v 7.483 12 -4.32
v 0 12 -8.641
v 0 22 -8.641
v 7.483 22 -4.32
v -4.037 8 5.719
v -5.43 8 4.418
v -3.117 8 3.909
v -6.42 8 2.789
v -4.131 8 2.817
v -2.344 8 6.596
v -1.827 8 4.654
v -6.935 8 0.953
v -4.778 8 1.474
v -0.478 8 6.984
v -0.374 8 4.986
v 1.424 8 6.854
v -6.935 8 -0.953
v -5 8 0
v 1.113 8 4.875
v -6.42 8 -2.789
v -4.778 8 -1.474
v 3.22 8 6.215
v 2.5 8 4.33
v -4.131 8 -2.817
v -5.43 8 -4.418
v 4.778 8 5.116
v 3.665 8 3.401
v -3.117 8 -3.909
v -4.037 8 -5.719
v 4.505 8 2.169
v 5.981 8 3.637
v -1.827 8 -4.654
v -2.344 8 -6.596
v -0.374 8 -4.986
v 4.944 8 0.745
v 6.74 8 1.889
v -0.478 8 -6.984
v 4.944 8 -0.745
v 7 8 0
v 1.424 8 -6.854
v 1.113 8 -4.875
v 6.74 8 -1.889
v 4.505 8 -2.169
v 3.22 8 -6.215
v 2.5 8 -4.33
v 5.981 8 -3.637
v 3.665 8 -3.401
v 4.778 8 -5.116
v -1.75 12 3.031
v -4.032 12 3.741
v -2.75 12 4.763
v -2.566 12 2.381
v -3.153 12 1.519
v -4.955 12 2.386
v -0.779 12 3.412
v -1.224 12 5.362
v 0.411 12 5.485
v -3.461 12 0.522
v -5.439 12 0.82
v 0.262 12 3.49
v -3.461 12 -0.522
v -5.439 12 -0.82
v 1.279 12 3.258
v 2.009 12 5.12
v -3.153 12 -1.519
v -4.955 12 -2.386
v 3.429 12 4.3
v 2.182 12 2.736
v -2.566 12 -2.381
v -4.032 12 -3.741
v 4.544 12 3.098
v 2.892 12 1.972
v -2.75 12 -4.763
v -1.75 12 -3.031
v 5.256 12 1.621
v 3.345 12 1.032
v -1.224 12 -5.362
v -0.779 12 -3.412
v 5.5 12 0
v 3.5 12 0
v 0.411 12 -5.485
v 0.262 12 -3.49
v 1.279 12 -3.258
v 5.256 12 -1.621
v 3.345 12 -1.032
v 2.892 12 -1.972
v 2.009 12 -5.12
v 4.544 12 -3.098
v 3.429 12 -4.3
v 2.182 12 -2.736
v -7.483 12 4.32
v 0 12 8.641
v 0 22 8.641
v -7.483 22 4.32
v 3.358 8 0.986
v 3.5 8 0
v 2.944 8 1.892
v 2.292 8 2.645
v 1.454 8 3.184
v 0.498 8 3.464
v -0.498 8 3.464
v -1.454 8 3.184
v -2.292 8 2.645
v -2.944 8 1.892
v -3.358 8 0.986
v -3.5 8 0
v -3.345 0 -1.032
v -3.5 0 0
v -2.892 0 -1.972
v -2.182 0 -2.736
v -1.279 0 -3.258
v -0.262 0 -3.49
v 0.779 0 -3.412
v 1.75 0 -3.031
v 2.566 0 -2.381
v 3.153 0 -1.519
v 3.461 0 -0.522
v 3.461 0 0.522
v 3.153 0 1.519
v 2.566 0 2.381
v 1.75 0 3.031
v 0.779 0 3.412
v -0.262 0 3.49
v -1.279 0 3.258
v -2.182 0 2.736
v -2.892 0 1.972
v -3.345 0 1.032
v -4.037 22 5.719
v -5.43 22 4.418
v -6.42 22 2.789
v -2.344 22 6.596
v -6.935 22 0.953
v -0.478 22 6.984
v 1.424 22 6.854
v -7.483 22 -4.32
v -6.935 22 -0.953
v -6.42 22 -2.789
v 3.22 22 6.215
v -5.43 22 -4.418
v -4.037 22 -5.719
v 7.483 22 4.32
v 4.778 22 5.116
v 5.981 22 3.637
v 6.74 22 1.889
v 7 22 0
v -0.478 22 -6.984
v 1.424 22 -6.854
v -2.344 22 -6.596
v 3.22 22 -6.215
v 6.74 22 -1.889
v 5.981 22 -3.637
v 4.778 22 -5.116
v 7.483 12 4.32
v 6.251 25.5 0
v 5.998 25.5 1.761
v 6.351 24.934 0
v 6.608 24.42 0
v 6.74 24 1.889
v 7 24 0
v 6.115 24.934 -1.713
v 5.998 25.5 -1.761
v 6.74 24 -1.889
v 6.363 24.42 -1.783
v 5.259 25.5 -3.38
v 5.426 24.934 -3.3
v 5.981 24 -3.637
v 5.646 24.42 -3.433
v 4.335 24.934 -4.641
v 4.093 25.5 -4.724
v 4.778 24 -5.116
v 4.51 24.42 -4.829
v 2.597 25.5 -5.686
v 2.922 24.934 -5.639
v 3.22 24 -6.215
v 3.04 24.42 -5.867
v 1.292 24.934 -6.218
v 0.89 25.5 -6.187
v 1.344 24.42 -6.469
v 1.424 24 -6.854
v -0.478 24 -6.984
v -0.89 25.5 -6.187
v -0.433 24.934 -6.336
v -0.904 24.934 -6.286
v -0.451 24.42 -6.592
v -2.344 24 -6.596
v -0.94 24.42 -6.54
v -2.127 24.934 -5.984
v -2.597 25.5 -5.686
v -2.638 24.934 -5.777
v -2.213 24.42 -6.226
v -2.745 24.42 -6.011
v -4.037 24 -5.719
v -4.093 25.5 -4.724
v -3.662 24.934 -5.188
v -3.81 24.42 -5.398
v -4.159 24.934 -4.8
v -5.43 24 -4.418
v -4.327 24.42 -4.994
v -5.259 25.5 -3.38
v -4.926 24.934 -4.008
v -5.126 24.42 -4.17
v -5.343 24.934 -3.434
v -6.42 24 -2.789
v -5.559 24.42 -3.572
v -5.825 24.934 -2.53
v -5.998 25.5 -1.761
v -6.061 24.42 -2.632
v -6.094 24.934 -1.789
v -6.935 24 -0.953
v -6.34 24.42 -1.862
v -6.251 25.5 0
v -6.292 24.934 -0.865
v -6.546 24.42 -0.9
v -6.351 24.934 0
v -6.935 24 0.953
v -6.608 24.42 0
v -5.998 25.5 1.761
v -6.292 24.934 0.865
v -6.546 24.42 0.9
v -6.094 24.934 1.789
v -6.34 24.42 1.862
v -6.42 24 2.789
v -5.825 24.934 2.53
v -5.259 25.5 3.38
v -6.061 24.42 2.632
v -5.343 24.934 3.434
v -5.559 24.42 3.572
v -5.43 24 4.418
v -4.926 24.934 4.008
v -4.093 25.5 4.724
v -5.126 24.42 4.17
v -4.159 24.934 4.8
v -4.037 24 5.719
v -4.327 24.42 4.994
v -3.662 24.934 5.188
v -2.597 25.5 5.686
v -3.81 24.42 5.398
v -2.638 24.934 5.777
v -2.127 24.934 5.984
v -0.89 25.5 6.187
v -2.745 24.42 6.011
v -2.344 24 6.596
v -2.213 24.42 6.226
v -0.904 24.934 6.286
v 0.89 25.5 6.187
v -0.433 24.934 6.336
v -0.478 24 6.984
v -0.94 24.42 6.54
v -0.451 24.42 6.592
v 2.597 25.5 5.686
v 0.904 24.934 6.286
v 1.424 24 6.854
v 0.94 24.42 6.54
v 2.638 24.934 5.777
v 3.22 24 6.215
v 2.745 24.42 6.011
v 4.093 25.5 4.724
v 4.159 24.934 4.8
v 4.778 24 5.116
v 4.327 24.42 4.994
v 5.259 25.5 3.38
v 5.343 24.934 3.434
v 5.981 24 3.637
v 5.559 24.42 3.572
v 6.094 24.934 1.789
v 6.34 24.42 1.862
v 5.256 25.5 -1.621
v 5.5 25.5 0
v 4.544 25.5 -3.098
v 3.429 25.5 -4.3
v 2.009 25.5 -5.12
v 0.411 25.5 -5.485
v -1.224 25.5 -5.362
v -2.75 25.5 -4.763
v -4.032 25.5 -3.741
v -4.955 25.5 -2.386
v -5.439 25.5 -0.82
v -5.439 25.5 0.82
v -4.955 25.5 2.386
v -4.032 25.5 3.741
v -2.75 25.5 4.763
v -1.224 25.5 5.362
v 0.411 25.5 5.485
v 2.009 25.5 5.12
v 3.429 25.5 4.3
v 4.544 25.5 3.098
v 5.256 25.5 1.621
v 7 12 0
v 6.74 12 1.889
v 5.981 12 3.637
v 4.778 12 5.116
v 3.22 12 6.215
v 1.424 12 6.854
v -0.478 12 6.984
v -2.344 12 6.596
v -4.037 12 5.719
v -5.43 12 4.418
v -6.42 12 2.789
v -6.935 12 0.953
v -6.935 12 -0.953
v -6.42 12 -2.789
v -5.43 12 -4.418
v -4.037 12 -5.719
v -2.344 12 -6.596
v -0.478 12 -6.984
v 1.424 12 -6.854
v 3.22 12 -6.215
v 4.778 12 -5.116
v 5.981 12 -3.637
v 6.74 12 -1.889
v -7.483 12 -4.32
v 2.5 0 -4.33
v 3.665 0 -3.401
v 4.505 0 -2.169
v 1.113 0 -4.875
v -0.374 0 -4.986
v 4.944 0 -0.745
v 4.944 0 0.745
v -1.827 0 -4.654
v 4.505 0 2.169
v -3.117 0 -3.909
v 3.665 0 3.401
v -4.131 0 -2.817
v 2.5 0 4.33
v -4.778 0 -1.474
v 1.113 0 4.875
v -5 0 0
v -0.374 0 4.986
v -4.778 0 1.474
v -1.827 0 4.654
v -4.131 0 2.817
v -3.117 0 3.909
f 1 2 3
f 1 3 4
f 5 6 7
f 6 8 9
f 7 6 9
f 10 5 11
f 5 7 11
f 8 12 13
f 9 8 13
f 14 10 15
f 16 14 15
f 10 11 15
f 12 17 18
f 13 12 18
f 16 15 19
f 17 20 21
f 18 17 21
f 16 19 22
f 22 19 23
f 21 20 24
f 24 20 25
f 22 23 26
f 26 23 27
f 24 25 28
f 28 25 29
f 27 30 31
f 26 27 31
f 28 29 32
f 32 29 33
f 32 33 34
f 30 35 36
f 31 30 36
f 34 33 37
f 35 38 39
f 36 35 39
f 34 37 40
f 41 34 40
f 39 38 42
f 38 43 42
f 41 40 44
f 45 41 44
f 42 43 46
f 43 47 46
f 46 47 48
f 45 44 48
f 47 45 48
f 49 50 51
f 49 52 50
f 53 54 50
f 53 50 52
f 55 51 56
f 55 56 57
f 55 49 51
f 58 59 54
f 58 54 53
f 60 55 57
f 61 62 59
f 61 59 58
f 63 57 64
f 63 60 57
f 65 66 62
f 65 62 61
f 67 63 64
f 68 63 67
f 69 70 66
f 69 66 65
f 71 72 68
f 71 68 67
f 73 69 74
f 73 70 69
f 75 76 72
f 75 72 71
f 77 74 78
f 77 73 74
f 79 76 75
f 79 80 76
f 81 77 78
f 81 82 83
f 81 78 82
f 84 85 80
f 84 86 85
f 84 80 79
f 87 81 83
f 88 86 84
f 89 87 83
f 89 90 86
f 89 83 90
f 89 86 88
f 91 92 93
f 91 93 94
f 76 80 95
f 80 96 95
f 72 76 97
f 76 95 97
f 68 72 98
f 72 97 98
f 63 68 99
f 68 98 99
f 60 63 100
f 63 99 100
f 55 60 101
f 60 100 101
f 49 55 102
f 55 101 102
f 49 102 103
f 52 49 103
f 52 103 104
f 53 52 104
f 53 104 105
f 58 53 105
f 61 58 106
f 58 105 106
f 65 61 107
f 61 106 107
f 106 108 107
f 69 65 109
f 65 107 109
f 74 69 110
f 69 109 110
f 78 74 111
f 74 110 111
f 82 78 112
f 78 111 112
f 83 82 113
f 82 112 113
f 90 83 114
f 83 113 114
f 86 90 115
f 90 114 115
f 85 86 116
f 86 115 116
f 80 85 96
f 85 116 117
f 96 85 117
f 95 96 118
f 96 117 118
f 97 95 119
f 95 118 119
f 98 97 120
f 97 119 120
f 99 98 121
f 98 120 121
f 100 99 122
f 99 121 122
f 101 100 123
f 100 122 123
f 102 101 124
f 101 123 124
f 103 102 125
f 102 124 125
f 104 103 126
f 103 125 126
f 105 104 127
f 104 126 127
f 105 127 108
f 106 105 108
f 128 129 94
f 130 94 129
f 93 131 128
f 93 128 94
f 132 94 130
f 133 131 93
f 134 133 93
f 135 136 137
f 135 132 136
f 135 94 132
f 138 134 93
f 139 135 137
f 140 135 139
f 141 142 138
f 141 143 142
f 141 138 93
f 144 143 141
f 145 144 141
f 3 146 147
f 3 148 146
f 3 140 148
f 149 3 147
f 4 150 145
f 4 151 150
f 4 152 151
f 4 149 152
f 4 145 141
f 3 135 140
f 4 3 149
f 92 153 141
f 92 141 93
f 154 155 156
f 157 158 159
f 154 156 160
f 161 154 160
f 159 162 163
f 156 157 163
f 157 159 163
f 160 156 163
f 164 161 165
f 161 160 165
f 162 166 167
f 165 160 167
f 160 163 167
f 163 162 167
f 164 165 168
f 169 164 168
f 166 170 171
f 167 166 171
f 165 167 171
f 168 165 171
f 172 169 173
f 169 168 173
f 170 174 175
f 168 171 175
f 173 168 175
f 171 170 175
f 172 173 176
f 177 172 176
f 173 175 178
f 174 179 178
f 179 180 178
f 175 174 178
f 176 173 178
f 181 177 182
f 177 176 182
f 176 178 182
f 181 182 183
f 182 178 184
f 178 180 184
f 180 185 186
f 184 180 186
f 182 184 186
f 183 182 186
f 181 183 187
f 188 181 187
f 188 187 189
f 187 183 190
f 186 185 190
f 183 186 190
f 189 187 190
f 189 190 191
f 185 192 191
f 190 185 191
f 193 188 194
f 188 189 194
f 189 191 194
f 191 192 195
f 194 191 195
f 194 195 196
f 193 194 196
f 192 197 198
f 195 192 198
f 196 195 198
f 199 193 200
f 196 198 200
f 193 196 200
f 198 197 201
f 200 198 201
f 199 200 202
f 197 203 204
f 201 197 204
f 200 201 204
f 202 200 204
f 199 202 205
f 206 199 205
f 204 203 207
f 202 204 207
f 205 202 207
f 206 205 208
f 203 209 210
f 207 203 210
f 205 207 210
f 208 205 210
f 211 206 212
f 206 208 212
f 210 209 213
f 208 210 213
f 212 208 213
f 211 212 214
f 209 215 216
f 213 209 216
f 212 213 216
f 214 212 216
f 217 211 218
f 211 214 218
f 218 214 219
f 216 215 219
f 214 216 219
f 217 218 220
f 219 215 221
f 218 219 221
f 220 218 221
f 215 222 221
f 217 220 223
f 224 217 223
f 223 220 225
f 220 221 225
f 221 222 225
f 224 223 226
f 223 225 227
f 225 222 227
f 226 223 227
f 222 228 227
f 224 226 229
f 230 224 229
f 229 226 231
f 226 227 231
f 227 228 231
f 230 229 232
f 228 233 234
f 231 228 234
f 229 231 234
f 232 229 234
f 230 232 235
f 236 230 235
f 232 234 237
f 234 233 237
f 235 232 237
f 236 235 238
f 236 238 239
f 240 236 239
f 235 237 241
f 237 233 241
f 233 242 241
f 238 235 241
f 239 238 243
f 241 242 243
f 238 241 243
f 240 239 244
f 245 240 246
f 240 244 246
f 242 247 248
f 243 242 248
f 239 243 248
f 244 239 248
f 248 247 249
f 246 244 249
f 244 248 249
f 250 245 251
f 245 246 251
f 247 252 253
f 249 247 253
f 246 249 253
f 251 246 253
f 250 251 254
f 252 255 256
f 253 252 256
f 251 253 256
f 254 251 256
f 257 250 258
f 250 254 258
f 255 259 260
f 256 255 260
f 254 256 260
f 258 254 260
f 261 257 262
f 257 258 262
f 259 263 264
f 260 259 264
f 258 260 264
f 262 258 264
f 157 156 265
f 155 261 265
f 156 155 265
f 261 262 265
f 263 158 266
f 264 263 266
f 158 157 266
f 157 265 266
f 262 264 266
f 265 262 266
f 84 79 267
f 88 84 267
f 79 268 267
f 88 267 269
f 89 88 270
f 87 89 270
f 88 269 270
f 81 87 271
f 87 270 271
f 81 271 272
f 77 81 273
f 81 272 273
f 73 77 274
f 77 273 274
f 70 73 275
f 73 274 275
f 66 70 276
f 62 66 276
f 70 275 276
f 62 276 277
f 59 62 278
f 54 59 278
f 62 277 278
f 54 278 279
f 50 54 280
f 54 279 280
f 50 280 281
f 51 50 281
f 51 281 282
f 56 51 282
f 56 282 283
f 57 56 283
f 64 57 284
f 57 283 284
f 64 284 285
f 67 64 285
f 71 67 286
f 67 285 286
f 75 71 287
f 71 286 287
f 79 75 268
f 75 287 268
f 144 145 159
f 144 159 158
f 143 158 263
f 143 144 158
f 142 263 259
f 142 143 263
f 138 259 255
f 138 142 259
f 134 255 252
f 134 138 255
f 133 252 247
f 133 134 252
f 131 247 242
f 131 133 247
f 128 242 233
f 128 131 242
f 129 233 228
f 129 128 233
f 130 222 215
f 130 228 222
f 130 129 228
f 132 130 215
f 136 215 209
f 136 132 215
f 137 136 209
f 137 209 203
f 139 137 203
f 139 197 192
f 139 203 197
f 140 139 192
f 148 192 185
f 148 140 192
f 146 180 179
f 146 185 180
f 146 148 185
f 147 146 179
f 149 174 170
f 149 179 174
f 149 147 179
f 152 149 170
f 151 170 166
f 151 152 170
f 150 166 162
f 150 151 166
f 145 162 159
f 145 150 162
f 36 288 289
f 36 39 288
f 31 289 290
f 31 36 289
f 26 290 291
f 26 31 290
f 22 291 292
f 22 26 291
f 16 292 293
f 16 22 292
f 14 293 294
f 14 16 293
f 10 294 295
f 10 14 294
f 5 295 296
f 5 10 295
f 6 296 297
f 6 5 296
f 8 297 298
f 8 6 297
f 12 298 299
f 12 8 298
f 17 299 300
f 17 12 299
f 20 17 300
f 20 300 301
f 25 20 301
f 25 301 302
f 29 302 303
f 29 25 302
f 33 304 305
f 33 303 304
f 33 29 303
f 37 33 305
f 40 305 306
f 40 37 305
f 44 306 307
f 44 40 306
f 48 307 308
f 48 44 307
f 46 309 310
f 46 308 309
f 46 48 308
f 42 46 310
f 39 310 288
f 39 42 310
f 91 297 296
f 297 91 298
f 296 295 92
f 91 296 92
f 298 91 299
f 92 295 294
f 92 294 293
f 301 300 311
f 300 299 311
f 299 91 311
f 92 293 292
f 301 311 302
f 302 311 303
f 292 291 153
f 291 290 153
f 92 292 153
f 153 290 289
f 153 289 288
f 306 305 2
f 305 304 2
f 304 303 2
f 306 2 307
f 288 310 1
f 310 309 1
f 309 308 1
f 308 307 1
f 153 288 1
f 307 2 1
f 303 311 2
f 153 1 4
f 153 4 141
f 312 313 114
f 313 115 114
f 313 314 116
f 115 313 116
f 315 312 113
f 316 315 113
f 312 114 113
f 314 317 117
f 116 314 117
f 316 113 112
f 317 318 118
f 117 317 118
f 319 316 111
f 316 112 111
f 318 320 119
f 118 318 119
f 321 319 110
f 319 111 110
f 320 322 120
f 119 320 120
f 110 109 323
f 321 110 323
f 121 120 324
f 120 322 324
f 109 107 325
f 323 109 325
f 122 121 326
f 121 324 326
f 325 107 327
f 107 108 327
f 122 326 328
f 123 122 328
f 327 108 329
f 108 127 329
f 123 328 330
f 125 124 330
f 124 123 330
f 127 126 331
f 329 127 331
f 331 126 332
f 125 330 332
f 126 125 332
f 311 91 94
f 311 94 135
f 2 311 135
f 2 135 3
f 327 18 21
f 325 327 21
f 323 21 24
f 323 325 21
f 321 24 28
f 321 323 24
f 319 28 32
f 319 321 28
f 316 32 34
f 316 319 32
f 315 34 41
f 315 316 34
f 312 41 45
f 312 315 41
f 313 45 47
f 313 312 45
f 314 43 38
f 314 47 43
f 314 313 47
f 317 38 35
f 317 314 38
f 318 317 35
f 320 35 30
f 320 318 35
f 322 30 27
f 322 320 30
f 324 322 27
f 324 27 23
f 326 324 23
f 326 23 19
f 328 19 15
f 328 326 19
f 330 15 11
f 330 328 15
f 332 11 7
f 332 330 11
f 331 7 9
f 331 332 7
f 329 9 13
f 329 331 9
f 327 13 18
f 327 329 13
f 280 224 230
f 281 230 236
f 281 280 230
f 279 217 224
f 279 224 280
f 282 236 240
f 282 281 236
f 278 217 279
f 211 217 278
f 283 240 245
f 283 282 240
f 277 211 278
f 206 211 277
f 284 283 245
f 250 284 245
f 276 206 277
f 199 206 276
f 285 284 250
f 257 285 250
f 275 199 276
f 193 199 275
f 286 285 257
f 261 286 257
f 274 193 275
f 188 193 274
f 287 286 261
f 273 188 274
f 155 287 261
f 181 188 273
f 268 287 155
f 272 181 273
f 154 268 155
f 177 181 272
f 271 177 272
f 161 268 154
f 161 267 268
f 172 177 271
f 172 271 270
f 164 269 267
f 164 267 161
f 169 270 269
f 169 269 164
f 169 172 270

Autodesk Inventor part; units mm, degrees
ref_plane "YZ Plane" through (0, 0, 0) normal (1, 0, 0) x (0, 1, 0)
ref_plane "XZ Plane" through (0, 0, 0) normal (0, 1, 0) x (-1, 0, 0)
ref_plane "XY Plane" through (0, 0, 0) normal (0, 0, 1) x (1, 0, 0)
sketch "Sketch1" plane through (0, 0, 0) normal (0, 1, 0) x (-1, 0, 0)
  circle A0 centre (0, 0) radius 5
  circle A1 centre (0, 0) radius 3.5
  dimension "d0" = 10
  dimension "d1" = 7
extrude "Extrusion1" add sketch "Sketch1" along normal blind 8
sketch "Sketch2" plane through (0, 8, 0) normal (0, 1, 0) x (1, 0, 0)
  circle A0 centre (0, 0) radius 7
  circle A1 centre (0, 0) radius 5 projected
  circle A2 centre (0, 0) radius 3.5 projected
  dimension "d4" = 14
extrude "Extrusion2" add sketch "Sketch2" along normal blind 4 contours A0 | A1
sketch "Sketch3" plane through (0, 12, 0) normal (0, 1, 0) x (1, 0, 0)
  line L0 (-7.483, 4.3203) -> (0, 8.6406)
  line L1 (0, 8.6406) -> (7.483, 4.3203)
  line L2 (7.483, 4.3203) -> (7.483, -4.3203)
  line L3 (7.483, -4.3203) -> (0, -8.6406)
  line L4 (0, -8.6406) -> (-7.483, -4.3203)
  line L5 (-7.483, -4.3203) -> (-7.483, 4.3203)
  circle A0 centre (0, 0) radius 5 projected
extrude "Extrusion3" add sketch "Sketch3" along normal blind 10
sketch "Sketch4" plane through (0, 22, 0) normal (0, 1, 0) x (1, 0, 0)
  circle A0 centre (0, 0) radius 3.5 projected
  circle A1 centre (0, 0) radius 7
  circle A2 centre (0, 0) radius 5 projected
  circle A3 centre (0, 0) radius 5
  dimension "d9" = 14
extrude "Extrusion4" add sketch "Sketch4" along normal blind 2 contours A1
sketch "Sketch5" plane through (0, 24, 0) normal (0, 1, 0) x (1, 0, 0)
  circle A0 centre (0, 0) radius 6.25
  circle A1 centre (0, 0) radius 5
  dimension "d12" = 12.5
extrude "Extrusion5" add sketch "Sketch5" along normal blind 1.5
fillet "Fillet1" radius 2 1 edges at (-6.25, 24, 0)
thread "Thread1" size "M10x1.5" class "6g" standard "ANSI Metric M Profile" full length
sketch "Sketch6" plane through (0, 25.5, 0) normal (0, 1, 0) x (1, 0, 0)
  circle A0 centre (0, 0) radius 5.5
  dimension "d18" = 11
extrude "Extrusion6" cut sketch "Sketch6" against normal blind 13.5
sketch "Sketch7" plane through (0, 25.5, 0) normal (0, 1, 0) x (1, 0, 0)
  circle A0 centre (0, 0) radius 5.5 projected
properties part number "entrada_manguera_alicat_presion"
